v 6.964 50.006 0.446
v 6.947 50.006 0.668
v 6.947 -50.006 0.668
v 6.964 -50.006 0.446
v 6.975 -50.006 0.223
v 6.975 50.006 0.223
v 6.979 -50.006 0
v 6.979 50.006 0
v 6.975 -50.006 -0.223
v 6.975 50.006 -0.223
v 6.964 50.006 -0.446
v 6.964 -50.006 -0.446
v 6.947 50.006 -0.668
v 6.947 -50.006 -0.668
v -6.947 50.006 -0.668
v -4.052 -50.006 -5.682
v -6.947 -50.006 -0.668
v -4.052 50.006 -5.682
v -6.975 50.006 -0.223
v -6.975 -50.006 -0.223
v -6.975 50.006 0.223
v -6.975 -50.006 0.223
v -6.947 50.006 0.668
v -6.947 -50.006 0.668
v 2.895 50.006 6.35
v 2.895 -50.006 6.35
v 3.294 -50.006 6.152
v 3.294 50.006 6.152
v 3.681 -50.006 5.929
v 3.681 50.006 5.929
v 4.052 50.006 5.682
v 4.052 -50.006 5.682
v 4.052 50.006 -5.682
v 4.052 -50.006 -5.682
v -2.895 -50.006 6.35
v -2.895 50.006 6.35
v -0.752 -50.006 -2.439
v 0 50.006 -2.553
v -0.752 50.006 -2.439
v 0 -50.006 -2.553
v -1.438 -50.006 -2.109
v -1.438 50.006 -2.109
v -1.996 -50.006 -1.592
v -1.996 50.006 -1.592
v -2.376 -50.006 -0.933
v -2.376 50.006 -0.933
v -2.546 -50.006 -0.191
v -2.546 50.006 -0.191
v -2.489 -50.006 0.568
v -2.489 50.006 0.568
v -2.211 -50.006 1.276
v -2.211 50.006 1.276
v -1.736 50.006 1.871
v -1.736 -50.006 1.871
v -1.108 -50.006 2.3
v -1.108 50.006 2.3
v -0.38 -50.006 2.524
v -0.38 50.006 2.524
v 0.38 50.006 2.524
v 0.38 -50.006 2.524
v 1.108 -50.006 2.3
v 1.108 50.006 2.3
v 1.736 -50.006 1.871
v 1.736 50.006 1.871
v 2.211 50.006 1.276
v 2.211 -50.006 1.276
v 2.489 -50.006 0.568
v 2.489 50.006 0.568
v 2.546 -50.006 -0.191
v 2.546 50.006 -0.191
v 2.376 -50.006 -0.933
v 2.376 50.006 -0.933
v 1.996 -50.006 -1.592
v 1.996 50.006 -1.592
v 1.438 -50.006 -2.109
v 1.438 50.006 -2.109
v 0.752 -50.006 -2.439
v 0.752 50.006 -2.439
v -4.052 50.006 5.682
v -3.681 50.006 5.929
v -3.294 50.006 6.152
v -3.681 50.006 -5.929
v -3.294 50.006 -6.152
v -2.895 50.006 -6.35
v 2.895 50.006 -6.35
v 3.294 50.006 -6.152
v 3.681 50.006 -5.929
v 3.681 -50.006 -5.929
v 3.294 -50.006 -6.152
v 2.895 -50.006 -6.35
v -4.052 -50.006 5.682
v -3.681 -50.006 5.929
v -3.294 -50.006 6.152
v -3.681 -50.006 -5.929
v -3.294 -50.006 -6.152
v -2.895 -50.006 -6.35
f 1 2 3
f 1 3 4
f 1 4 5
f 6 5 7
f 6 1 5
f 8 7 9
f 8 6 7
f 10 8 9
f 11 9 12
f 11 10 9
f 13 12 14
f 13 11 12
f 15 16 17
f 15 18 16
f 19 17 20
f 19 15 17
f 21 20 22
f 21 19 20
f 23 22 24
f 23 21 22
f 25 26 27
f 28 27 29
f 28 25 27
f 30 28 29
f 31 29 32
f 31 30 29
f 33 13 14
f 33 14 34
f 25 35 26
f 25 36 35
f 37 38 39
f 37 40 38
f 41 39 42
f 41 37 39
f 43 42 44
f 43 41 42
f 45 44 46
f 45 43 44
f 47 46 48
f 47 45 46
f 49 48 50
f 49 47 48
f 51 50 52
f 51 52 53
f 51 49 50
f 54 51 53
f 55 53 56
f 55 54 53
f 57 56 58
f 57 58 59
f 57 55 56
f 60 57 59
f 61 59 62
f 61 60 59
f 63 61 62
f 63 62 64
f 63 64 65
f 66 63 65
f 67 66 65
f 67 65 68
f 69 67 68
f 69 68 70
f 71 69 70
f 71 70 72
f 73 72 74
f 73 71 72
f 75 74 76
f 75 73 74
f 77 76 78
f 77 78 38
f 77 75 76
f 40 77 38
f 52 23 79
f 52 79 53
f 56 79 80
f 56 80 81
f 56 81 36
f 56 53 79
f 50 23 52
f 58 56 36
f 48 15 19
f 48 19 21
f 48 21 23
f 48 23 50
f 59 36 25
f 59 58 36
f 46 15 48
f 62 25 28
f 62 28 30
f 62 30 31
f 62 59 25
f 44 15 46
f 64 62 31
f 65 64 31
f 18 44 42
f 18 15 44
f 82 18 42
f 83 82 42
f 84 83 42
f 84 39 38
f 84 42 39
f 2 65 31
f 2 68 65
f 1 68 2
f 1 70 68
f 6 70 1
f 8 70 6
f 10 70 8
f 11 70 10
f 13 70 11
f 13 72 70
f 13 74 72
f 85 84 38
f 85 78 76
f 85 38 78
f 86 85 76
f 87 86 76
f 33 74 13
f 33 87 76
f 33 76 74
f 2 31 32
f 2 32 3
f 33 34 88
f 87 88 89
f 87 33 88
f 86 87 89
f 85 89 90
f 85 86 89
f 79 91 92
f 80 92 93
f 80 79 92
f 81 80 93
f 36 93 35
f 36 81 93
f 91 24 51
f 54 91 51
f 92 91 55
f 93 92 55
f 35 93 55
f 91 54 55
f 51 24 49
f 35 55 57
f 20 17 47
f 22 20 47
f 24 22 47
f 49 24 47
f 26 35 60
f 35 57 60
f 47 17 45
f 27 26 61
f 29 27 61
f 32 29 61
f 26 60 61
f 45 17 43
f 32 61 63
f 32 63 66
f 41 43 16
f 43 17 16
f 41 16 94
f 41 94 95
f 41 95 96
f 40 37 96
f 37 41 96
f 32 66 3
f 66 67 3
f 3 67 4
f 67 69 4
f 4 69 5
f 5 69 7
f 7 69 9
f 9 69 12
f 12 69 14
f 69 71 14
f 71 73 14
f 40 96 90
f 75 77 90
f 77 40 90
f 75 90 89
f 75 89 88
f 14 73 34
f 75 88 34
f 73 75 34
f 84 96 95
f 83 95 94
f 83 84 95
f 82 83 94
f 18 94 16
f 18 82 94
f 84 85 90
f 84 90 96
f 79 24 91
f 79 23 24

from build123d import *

# Parameters (mm, degrees)
SKETCH1_R           = 2.5527
BOSS_EXTRUDE1_DEPTH = 50.00625


with BuildPart() as part:
    # Sketch1 → Boss-Extrude1 (new, symmetric)
    with BuildSketch(Plane(origin=(0, 0, 0), x_dir=(1, 0, 0), z_dir=(0, 1, 0))):
        with BuildLine():
            ThreePointArc((2.89465988, -6.35), (3.489325, -6.043688184), (4.051931374, -5.681848992))
            Line((4.051931374, -5.681848992), (6.946591254, -0.668151008))
            ThreePointArc((6.946591254, -0.668151008), (6.970630706, -0.334459838), (6.97865, 0))
            ThreePointArc((6.97865, 0), (6.970630706, 0.334459838), (6.946591254, 0.668151008))
            Line((6.946591254, 0.668151008), (4.051931374, 5.681848992))
            ThreePointArc((4.051931374, 5.681848992), (3.489325, 6.043688184), (2.89465988, 6.35))
            Line((2.89465988, 6.35), (-2.89465988, 6.35))
            ThreePointArc((-2.89465988, 6.35), (-3.489325, 6.043688184), (-4.051931374, 5.681848992))
            Line((-4.051931374, 5.681848992), (-6.946591254, 0.668151008))
            ThreePointArc((-6.946591254, 0.668151008), (-6.97865, 0), (-6.946591254, -0.668151008))
            Line((-6.946591254, -0.668151008), (-4.051931374, -5.681848992))
            ThreePointArc((-4.051931374, -5.681848992), (-3.489325, -6.043688184), (-2.89465988, -6.35))
            Line((-2.89465988, -6.35), (2.89465988, -6.35))
        make_face()
        with Locations(Location((0, 0, 0), (0, 0, 90))):
            Circle(SKETCH1_R, mode=Mode.SUBTRACT)
    extrude(amount=BOSS_EXTRUDE1_DEPTH, both=True)


solid = part.part
